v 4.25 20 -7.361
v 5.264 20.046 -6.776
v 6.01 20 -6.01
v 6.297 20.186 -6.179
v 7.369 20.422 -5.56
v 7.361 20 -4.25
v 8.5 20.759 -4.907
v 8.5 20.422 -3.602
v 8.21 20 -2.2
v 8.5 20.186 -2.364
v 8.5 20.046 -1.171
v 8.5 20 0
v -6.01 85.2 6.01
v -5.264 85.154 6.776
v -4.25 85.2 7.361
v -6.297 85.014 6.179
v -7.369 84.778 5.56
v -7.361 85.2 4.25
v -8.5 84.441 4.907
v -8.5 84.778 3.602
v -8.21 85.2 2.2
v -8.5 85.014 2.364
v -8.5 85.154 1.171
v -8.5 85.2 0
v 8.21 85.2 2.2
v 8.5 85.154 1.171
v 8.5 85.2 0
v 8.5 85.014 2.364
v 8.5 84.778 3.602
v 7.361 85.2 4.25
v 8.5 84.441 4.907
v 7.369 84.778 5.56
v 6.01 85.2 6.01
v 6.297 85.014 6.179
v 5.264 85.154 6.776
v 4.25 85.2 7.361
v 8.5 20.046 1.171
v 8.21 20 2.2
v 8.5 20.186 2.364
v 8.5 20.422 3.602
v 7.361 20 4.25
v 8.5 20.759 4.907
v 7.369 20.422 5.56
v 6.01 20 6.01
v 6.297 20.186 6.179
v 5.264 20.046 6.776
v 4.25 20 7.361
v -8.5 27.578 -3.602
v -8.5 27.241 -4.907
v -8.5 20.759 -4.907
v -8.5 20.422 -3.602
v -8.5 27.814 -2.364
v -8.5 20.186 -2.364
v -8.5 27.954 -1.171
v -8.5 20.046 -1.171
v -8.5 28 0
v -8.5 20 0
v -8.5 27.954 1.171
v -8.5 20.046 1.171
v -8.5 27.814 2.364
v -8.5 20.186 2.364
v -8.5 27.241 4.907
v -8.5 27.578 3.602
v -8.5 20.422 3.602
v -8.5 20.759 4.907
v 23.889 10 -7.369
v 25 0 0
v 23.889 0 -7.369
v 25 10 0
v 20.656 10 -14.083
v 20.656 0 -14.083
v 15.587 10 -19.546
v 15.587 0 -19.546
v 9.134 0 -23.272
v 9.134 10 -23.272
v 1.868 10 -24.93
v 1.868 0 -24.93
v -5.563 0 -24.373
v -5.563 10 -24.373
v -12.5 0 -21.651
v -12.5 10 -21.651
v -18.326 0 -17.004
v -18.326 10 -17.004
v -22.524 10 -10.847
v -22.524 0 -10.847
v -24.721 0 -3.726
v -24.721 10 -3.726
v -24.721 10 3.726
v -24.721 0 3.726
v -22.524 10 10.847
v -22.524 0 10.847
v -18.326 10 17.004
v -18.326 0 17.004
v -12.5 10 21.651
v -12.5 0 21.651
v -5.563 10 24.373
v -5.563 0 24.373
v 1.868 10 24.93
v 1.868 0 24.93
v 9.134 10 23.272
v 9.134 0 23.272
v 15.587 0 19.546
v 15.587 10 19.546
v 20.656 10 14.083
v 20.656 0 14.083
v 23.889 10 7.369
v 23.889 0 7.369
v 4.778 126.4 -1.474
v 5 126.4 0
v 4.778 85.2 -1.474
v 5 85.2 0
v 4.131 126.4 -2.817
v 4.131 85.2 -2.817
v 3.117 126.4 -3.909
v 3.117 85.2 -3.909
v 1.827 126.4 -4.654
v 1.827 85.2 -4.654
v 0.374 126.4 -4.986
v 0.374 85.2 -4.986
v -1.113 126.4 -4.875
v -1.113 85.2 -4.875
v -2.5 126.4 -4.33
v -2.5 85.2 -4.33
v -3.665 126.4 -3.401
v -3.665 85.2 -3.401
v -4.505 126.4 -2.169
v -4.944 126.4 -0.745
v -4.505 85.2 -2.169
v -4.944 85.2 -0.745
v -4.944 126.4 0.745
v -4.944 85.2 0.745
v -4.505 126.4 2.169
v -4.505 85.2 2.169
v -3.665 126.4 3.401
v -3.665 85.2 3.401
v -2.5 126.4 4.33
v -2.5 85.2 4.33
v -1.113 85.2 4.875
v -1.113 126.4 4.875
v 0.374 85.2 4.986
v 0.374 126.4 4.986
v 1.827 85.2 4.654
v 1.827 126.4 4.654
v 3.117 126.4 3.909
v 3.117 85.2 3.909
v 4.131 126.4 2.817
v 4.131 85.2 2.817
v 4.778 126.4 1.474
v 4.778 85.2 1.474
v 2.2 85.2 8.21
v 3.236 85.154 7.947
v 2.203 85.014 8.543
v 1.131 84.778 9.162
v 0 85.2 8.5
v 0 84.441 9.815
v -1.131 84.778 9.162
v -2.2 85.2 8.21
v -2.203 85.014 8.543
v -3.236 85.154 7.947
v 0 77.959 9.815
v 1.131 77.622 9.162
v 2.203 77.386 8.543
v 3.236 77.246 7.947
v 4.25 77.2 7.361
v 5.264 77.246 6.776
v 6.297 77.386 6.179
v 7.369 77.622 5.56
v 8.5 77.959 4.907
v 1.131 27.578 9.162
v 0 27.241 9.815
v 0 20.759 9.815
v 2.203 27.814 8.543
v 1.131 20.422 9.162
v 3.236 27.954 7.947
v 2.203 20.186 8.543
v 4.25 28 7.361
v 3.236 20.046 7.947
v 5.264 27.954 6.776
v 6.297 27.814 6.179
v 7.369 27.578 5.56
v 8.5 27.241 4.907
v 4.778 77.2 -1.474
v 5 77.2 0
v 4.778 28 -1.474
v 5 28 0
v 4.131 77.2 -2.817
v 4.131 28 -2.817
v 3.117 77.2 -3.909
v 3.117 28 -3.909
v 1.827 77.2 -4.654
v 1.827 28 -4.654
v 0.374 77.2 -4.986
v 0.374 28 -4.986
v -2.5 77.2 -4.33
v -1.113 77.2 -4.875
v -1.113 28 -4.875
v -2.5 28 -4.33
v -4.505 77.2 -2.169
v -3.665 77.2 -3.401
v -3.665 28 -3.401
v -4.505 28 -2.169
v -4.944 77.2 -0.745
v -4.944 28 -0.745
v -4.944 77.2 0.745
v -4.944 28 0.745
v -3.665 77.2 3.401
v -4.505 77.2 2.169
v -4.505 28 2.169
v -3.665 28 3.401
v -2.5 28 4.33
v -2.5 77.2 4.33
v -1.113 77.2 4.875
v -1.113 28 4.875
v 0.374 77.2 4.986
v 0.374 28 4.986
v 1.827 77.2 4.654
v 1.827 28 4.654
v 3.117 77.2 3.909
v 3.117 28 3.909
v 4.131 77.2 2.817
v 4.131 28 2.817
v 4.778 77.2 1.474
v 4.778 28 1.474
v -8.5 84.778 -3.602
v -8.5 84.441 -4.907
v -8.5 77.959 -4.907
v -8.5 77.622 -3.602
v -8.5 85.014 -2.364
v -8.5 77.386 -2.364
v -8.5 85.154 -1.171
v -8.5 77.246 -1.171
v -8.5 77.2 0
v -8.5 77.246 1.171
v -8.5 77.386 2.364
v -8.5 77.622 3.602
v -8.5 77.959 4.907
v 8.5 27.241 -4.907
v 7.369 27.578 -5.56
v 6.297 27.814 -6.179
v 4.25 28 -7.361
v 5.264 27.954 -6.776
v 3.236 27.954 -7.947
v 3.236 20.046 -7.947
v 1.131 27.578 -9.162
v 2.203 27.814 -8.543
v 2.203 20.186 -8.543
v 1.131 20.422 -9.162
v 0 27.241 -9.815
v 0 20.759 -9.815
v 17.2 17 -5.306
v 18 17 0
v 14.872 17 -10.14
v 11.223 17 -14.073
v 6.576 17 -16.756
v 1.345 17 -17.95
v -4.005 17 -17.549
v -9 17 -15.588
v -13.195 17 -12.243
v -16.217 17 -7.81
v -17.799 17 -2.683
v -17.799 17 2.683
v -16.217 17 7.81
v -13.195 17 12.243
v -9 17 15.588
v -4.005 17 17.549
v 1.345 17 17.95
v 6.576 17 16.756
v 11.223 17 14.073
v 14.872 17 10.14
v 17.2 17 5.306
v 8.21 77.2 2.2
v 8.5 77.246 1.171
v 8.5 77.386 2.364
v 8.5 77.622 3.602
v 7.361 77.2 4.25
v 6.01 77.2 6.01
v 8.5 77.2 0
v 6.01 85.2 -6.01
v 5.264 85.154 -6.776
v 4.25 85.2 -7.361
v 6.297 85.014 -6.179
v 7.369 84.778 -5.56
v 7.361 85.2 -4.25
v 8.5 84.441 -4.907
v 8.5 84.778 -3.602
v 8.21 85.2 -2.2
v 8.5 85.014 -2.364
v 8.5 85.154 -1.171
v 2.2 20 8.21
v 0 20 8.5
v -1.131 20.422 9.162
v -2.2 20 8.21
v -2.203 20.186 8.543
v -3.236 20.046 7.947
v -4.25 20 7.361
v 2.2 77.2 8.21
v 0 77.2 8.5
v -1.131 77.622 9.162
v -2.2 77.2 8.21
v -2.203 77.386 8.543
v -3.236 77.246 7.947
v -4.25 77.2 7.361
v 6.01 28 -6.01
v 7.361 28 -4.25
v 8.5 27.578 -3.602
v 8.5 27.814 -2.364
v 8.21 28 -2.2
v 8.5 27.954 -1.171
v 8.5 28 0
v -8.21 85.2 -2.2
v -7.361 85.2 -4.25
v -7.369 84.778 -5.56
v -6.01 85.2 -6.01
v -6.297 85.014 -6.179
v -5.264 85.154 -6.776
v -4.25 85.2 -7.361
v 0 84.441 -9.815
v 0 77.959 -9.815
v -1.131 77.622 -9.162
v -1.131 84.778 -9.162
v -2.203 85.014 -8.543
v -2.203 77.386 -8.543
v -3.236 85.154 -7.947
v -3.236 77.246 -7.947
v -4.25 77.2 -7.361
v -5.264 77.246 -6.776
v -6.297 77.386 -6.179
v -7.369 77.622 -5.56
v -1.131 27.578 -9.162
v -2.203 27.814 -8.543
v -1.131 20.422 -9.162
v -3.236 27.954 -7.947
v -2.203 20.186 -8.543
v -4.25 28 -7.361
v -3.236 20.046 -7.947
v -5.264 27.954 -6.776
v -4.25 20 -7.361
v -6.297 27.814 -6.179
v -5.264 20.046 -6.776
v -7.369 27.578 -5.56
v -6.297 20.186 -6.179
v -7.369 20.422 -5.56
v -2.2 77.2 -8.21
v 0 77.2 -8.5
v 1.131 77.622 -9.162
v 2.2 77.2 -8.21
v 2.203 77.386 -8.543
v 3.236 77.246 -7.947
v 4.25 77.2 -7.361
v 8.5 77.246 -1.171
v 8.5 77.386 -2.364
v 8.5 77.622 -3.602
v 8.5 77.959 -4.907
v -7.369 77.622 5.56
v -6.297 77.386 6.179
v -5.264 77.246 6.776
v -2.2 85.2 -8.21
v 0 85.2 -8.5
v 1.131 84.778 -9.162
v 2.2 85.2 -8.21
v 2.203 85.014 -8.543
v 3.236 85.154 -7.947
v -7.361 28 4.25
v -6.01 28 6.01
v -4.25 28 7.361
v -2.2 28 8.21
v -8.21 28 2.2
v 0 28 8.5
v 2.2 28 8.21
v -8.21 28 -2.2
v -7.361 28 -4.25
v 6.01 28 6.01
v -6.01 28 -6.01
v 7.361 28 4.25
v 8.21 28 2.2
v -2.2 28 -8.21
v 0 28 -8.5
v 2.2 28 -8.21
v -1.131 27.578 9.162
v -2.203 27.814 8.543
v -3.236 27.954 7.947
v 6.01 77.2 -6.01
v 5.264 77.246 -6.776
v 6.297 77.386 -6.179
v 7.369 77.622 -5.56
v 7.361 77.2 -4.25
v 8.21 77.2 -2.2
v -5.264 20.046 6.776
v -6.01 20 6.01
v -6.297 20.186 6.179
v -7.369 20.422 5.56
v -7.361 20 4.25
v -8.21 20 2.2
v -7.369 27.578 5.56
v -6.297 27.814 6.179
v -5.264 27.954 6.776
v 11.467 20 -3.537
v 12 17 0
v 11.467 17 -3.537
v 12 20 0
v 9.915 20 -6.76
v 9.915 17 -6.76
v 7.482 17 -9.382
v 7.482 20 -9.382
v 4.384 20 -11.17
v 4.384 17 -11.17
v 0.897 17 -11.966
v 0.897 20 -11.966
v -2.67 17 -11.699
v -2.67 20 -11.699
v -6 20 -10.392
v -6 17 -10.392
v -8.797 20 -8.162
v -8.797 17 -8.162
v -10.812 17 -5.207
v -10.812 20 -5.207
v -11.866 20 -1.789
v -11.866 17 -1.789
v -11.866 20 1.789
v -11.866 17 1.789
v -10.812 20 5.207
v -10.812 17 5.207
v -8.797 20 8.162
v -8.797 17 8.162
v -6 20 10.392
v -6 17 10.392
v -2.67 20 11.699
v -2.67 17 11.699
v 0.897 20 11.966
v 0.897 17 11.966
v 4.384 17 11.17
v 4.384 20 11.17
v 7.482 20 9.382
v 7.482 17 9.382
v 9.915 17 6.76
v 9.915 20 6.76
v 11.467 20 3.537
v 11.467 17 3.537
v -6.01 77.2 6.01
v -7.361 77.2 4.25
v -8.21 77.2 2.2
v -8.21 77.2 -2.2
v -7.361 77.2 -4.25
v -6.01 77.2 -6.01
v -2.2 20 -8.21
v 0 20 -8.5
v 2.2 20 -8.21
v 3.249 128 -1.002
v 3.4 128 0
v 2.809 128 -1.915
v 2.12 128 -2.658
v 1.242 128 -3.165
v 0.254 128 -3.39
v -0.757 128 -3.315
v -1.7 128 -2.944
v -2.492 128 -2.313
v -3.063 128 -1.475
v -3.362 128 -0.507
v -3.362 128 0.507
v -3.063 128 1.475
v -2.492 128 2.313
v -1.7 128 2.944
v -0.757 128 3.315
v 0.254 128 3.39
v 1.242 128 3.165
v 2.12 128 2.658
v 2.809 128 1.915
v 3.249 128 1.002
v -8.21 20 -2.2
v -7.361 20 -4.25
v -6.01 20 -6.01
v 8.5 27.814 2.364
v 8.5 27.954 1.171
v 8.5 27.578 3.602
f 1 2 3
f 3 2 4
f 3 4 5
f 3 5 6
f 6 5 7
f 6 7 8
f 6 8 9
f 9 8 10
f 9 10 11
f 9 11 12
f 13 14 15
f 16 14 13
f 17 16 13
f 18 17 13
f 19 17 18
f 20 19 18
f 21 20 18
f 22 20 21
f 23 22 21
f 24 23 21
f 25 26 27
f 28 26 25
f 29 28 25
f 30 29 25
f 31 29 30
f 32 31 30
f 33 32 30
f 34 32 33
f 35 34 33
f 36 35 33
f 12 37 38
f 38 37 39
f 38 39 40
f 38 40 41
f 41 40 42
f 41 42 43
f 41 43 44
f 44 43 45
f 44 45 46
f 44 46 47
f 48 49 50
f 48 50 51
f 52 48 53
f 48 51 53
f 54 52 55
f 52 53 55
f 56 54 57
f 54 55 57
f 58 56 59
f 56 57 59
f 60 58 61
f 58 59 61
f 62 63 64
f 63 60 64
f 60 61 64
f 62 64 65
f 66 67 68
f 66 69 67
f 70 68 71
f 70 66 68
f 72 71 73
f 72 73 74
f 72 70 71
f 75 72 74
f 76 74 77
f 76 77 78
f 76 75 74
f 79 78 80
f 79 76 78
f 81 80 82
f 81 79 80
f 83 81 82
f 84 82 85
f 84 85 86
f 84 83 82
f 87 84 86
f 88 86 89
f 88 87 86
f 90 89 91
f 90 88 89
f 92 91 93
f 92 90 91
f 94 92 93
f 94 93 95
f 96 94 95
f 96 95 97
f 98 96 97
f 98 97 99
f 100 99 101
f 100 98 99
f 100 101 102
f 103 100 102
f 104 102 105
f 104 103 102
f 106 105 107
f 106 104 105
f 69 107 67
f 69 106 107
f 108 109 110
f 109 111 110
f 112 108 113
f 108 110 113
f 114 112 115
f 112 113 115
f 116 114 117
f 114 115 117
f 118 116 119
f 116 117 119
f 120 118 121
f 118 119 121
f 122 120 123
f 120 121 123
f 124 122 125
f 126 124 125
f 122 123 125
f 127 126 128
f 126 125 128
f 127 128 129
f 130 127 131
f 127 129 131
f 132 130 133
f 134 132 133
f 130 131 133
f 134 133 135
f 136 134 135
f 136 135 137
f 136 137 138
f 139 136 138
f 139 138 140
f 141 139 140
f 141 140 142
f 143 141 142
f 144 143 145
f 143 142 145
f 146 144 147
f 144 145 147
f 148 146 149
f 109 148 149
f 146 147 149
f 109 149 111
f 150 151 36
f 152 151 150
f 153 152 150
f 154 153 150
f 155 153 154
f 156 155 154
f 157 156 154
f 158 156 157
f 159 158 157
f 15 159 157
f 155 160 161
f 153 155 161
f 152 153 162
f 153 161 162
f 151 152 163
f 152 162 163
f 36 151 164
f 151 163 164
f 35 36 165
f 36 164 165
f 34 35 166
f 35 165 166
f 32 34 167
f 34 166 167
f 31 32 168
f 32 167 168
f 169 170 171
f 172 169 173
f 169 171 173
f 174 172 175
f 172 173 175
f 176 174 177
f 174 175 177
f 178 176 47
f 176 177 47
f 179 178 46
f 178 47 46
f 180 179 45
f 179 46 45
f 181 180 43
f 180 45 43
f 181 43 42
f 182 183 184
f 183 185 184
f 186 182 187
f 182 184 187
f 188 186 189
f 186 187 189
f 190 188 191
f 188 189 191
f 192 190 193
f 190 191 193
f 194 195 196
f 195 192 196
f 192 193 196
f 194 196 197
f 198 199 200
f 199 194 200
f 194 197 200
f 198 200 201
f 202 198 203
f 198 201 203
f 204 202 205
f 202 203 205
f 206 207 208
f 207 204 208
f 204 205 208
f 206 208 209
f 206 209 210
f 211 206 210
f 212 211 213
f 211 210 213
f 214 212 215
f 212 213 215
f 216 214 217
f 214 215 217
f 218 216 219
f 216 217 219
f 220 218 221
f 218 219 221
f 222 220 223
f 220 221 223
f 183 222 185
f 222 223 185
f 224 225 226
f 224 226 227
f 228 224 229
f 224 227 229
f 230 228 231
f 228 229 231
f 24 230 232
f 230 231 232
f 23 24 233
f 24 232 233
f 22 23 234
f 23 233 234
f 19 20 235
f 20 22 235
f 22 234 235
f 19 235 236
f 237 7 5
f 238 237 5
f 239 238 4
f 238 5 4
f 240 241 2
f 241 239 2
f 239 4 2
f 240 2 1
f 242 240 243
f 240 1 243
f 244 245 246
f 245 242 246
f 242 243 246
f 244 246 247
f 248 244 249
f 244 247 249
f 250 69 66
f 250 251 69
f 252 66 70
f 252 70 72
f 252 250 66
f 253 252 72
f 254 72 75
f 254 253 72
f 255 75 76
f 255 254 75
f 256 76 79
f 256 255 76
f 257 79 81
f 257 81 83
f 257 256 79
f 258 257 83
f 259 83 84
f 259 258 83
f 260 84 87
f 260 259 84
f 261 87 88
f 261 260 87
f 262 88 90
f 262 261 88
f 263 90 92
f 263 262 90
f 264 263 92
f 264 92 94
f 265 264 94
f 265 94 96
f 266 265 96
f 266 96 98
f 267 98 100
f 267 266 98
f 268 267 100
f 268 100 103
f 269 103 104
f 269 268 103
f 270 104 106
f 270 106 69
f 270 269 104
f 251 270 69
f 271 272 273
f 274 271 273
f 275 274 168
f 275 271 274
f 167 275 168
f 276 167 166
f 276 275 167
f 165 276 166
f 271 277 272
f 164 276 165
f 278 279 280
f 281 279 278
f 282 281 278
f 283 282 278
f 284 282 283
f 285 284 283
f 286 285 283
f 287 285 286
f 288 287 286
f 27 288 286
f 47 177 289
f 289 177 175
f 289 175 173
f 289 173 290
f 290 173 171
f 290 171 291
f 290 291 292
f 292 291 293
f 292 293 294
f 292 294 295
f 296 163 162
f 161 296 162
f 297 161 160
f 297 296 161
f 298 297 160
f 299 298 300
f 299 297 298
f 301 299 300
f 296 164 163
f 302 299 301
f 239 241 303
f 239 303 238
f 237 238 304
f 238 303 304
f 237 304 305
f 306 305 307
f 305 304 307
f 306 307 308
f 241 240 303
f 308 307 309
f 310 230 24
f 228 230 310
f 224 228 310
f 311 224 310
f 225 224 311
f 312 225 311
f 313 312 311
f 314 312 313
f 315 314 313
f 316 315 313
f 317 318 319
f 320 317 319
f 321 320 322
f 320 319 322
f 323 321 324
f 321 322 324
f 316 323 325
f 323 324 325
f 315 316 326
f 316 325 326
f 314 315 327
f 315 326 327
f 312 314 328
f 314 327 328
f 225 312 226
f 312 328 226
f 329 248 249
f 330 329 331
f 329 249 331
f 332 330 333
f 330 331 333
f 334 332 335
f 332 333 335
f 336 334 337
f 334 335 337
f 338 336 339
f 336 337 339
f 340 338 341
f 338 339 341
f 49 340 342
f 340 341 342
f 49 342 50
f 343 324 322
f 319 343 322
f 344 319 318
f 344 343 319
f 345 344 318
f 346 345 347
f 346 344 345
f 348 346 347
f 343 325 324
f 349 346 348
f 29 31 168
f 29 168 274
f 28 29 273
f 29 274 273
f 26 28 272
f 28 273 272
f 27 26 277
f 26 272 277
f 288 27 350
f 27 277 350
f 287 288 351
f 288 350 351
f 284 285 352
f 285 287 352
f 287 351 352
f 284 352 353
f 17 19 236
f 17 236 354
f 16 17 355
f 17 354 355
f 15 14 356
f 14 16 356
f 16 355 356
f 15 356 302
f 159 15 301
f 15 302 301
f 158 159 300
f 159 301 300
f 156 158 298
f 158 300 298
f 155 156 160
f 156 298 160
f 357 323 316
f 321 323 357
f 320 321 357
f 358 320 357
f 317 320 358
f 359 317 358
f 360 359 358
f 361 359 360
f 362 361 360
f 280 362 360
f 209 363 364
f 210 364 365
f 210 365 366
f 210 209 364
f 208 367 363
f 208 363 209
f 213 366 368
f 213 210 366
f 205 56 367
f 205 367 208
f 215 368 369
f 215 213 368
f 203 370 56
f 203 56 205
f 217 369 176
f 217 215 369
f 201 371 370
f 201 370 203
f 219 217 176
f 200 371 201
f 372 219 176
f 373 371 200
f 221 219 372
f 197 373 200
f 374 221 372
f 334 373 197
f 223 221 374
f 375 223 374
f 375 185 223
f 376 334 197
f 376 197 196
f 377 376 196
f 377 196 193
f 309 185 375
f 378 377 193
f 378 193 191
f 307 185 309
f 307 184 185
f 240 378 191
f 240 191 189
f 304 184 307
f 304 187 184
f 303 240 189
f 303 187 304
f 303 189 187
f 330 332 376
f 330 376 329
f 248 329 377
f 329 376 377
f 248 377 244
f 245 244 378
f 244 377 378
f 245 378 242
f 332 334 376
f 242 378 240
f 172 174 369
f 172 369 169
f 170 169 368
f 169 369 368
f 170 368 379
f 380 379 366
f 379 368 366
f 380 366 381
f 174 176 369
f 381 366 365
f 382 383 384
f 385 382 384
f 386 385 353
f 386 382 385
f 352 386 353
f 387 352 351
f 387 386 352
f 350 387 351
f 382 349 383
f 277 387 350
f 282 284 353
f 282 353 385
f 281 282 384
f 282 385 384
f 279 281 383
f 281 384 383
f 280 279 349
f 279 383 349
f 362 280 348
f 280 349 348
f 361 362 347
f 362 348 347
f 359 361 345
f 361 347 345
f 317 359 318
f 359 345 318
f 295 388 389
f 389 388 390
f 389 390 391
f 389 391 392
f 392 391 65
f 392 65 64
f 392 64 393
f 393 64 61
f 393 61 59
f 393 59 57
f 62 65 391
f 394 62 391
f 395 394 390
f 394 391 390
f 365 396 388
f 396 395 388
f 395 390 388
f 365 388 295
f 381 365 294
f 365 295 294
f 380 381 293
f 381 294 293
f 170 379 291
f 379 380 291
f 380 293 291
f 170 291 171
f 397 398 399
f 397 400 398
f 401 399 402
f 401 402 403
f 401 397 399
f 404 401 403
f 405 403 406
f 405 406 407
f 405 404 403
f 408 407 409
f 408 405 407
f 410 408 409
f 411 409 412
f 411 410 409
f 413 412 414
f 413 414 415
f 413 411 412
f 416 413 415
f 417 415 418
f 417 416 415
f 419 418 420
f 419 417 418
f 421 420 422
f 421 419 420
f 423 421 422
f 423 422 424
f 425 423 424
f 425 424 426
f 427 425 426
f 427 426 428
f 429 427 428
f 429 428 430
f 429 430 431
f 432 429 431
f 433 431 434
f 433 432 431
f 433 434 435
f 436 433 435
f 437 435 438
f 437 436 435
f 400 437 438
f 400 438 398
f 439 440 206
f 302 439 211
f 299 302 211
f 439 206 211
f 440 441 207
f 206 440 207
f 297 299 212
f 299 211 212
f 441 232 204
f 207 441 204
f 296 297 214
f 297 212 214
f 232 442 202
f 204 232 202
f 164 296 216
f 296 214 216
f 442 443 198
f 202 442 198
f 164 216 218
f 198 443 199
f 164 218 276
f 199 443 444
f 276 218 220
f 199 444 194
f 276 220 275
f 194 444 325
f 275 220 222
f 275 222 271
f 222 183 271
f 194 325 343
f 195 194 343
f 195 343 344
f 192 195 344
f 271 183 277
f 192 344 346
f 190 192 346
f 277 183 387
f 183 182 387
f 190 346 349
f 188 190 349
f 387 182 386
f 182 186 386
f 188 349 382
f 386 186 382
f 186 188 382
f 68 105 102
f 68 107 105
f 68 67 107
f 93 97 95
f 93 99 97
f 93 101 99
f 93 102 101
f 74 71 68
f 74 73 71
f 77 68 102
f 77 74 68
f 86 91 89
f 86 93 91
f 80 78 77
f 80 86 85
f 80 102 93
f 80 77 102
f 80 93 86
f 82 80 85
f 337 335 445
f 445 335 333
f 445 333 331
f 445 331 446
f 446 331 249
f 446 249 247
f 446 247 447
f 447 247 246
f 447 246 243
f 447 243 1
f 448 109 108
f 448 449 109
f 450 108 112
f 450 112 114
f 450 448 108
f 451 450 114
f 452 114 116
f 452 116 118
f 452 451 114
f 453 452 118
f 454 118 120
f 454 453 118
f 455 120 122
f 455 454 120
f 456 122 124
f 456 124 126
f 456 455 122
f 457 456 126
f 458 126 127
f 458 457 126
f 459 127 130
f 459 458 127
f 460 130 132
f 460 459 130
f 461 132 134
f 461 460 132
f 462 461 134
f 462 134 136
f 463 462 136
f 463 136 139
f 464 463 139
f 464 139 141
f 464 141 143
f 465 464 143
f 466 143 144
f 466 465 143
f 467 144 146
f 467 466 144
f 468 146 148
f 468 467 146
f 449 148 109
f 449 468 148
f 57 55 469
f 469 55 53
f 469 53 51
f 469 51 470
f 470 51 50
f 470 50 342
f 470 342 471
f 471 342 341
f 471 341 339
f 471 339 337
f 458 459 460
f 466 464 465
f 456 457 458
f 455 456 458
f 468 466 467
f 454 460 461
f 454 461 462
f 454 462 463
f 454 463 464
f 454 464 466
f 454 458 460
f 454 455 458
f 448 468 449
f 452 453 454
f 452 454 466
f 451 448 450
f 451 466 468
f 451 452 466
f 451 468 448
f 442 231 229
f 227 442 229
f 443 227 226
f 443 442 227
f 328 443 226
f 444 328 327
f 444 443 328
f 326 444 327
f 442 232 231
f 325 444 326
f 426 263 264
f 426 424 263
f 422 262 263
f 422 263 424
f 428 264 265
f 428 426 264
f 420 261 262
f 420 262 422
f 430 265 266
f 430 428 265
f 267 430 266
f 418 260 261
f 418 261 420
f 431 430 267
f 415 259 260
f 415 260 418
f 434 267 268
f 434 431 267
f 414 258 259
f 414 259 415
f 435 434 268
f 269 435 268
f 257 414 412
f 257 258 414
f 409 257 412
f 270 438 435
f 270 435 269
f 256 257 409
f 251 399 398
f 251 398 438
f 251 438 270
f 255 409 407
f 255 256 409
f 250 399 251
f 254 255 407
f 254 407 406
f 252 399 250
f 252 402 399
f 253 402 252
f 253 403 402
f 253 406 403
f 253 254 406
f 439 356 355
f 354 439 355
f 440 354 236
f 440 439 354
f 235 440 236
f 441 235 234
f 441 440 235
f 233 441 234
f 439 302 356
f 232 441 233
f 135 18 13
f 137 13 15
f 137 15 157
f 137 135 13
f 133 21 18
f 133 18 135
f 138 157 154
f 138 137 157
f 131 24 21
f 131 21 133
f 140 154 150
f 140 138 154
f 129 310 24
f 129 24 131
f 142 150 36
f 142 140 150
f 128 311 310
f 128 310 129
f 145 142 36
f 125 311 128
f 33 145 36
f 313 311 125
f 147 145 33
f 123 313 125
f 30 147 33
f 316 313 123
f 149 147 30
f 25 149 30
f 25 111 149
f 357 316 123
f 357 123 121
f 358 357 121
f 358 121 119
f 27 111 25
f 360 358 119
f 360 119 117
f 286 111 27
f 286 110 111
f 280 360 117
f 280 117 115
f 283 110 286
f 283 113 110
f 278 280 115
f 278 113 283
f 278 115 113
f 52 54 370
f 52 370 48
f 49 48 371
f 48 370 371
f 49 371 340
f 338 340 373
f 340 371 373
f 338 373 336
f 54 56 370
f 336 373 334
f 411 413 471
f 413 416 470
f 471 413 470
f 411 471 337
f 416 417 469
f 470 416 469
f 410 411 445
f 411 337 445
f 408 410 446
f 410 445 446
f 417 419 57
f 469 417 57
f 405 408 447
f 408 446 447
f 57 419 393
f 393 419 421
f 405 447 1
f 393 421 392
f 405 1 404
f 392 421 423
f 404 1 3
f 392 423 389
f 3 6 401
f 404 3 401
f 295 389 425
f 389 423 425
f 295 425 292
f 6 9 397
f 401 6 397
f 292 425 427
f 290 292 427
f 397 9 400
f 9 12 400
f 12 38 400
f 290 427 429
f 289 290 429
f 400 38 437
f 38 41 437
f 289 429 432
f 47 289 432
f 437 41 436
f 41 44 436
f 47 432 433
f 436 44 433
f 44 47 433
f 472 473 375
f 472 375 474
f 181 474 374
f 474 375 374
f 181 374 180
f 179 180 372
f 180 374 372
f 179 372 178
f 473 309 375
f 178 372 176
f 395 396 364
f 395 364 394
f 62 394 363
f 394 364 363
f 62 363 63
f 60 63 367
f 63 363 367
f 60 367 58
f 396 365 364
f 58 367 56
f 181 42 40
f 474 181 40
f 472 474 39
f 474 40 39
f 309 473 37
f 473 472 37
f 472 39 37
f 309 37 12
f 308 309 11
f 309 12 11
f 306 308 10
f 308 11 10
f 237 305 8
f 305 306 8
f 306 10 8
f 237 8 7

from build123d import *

# Parameters (mm, degrees)
EXTRUDE_1_DEPTH = 8
EXTRUDE_2_DEPTH = 8


with BuildPart() as part:
    # Эскиз1 → Повернуть1 (revolve)
    with BuildSketch(Plane.XY, mode=Mode.PRIVATE) as revolve_1_sk:
        Polygon((0, 0), (-25, 0), (-25, 10), (-18, 17), (-12, 17), (-12, 20), (-5, 20), (-5, 28), (-5, 126.4), (-3.4, 128), (0, 128), align=None)
    revolve(revolve_1_sk.sketch.rotate(Axis((0, 0, 0), (0, 1, 0)), 180), axis=Axis((0, 0, 0), (0, 1, 0)))  # turned: the seam where the file's is

    # Эскиз2 → Бобышка-Вытянуть1 (add)
    with BuildSketch(Plane(origin=(0, 20, 0), x_dir=(1, 0, 0), z_dir=(0, 1, 0))):
        Polygon((0, 9.814954576), (-8.5, 4.907477288), (-8.5, -4.907477288), (0, -9.814954576), (8.5, -4.907477288), (8.5, 4.907477288), align=None)
    extrude(amount=EXTRUDE_1_DEPTH)

    # Эскиз3 → Бобышка-Вытянуть2 (add)
    with BuildSketch(Plane(origin=(0, 77.2, 0), x_dir=(1, 0, 0), z_dir=(0, 1, 0))):
        Polygon((8.5, 4.907477288), (0, 9.814954576), (-8.5, 4.907477288), (-8.5, -4.907477288), (0, -9.814954576), (8.5, -4.907477288), align=None)
    extrude(amount=EXTRUDE_2_DEPTH)

    # Эскиз4 → Вырез-Повернуть2 (revolve, cut)
    with BuildSketch(Plane.XY, mode=Mode.PRIVATE) as cut_revolve_2_sk:
        Polygon((-15.42820323, 85.2), (-8.5, 85.2), (-15.42820323, 81.2), align=None)
        Polygon((-15.42820323, 77.2), (-15.42820323, 81.2), (-8.5, 77.2), align=None)
        Polygon((-15.42820323, 28), (-15.42820323, 24), (-8.5, 28), align=None)
        Polygon((-15.42820323, 24), (-15.42820323, 20), (-8.5, 20), align=None)
    revolve(cut_revolve_2_sk.sketch.rotate(Axis((0, 128, 0), (0, -1, 0)), 180), axis=Axis((0, 128, 0), (0, -1, 0)), mode=Mode.SUBTRACT)  # turned: the seam where the file's is


solid = part.part
